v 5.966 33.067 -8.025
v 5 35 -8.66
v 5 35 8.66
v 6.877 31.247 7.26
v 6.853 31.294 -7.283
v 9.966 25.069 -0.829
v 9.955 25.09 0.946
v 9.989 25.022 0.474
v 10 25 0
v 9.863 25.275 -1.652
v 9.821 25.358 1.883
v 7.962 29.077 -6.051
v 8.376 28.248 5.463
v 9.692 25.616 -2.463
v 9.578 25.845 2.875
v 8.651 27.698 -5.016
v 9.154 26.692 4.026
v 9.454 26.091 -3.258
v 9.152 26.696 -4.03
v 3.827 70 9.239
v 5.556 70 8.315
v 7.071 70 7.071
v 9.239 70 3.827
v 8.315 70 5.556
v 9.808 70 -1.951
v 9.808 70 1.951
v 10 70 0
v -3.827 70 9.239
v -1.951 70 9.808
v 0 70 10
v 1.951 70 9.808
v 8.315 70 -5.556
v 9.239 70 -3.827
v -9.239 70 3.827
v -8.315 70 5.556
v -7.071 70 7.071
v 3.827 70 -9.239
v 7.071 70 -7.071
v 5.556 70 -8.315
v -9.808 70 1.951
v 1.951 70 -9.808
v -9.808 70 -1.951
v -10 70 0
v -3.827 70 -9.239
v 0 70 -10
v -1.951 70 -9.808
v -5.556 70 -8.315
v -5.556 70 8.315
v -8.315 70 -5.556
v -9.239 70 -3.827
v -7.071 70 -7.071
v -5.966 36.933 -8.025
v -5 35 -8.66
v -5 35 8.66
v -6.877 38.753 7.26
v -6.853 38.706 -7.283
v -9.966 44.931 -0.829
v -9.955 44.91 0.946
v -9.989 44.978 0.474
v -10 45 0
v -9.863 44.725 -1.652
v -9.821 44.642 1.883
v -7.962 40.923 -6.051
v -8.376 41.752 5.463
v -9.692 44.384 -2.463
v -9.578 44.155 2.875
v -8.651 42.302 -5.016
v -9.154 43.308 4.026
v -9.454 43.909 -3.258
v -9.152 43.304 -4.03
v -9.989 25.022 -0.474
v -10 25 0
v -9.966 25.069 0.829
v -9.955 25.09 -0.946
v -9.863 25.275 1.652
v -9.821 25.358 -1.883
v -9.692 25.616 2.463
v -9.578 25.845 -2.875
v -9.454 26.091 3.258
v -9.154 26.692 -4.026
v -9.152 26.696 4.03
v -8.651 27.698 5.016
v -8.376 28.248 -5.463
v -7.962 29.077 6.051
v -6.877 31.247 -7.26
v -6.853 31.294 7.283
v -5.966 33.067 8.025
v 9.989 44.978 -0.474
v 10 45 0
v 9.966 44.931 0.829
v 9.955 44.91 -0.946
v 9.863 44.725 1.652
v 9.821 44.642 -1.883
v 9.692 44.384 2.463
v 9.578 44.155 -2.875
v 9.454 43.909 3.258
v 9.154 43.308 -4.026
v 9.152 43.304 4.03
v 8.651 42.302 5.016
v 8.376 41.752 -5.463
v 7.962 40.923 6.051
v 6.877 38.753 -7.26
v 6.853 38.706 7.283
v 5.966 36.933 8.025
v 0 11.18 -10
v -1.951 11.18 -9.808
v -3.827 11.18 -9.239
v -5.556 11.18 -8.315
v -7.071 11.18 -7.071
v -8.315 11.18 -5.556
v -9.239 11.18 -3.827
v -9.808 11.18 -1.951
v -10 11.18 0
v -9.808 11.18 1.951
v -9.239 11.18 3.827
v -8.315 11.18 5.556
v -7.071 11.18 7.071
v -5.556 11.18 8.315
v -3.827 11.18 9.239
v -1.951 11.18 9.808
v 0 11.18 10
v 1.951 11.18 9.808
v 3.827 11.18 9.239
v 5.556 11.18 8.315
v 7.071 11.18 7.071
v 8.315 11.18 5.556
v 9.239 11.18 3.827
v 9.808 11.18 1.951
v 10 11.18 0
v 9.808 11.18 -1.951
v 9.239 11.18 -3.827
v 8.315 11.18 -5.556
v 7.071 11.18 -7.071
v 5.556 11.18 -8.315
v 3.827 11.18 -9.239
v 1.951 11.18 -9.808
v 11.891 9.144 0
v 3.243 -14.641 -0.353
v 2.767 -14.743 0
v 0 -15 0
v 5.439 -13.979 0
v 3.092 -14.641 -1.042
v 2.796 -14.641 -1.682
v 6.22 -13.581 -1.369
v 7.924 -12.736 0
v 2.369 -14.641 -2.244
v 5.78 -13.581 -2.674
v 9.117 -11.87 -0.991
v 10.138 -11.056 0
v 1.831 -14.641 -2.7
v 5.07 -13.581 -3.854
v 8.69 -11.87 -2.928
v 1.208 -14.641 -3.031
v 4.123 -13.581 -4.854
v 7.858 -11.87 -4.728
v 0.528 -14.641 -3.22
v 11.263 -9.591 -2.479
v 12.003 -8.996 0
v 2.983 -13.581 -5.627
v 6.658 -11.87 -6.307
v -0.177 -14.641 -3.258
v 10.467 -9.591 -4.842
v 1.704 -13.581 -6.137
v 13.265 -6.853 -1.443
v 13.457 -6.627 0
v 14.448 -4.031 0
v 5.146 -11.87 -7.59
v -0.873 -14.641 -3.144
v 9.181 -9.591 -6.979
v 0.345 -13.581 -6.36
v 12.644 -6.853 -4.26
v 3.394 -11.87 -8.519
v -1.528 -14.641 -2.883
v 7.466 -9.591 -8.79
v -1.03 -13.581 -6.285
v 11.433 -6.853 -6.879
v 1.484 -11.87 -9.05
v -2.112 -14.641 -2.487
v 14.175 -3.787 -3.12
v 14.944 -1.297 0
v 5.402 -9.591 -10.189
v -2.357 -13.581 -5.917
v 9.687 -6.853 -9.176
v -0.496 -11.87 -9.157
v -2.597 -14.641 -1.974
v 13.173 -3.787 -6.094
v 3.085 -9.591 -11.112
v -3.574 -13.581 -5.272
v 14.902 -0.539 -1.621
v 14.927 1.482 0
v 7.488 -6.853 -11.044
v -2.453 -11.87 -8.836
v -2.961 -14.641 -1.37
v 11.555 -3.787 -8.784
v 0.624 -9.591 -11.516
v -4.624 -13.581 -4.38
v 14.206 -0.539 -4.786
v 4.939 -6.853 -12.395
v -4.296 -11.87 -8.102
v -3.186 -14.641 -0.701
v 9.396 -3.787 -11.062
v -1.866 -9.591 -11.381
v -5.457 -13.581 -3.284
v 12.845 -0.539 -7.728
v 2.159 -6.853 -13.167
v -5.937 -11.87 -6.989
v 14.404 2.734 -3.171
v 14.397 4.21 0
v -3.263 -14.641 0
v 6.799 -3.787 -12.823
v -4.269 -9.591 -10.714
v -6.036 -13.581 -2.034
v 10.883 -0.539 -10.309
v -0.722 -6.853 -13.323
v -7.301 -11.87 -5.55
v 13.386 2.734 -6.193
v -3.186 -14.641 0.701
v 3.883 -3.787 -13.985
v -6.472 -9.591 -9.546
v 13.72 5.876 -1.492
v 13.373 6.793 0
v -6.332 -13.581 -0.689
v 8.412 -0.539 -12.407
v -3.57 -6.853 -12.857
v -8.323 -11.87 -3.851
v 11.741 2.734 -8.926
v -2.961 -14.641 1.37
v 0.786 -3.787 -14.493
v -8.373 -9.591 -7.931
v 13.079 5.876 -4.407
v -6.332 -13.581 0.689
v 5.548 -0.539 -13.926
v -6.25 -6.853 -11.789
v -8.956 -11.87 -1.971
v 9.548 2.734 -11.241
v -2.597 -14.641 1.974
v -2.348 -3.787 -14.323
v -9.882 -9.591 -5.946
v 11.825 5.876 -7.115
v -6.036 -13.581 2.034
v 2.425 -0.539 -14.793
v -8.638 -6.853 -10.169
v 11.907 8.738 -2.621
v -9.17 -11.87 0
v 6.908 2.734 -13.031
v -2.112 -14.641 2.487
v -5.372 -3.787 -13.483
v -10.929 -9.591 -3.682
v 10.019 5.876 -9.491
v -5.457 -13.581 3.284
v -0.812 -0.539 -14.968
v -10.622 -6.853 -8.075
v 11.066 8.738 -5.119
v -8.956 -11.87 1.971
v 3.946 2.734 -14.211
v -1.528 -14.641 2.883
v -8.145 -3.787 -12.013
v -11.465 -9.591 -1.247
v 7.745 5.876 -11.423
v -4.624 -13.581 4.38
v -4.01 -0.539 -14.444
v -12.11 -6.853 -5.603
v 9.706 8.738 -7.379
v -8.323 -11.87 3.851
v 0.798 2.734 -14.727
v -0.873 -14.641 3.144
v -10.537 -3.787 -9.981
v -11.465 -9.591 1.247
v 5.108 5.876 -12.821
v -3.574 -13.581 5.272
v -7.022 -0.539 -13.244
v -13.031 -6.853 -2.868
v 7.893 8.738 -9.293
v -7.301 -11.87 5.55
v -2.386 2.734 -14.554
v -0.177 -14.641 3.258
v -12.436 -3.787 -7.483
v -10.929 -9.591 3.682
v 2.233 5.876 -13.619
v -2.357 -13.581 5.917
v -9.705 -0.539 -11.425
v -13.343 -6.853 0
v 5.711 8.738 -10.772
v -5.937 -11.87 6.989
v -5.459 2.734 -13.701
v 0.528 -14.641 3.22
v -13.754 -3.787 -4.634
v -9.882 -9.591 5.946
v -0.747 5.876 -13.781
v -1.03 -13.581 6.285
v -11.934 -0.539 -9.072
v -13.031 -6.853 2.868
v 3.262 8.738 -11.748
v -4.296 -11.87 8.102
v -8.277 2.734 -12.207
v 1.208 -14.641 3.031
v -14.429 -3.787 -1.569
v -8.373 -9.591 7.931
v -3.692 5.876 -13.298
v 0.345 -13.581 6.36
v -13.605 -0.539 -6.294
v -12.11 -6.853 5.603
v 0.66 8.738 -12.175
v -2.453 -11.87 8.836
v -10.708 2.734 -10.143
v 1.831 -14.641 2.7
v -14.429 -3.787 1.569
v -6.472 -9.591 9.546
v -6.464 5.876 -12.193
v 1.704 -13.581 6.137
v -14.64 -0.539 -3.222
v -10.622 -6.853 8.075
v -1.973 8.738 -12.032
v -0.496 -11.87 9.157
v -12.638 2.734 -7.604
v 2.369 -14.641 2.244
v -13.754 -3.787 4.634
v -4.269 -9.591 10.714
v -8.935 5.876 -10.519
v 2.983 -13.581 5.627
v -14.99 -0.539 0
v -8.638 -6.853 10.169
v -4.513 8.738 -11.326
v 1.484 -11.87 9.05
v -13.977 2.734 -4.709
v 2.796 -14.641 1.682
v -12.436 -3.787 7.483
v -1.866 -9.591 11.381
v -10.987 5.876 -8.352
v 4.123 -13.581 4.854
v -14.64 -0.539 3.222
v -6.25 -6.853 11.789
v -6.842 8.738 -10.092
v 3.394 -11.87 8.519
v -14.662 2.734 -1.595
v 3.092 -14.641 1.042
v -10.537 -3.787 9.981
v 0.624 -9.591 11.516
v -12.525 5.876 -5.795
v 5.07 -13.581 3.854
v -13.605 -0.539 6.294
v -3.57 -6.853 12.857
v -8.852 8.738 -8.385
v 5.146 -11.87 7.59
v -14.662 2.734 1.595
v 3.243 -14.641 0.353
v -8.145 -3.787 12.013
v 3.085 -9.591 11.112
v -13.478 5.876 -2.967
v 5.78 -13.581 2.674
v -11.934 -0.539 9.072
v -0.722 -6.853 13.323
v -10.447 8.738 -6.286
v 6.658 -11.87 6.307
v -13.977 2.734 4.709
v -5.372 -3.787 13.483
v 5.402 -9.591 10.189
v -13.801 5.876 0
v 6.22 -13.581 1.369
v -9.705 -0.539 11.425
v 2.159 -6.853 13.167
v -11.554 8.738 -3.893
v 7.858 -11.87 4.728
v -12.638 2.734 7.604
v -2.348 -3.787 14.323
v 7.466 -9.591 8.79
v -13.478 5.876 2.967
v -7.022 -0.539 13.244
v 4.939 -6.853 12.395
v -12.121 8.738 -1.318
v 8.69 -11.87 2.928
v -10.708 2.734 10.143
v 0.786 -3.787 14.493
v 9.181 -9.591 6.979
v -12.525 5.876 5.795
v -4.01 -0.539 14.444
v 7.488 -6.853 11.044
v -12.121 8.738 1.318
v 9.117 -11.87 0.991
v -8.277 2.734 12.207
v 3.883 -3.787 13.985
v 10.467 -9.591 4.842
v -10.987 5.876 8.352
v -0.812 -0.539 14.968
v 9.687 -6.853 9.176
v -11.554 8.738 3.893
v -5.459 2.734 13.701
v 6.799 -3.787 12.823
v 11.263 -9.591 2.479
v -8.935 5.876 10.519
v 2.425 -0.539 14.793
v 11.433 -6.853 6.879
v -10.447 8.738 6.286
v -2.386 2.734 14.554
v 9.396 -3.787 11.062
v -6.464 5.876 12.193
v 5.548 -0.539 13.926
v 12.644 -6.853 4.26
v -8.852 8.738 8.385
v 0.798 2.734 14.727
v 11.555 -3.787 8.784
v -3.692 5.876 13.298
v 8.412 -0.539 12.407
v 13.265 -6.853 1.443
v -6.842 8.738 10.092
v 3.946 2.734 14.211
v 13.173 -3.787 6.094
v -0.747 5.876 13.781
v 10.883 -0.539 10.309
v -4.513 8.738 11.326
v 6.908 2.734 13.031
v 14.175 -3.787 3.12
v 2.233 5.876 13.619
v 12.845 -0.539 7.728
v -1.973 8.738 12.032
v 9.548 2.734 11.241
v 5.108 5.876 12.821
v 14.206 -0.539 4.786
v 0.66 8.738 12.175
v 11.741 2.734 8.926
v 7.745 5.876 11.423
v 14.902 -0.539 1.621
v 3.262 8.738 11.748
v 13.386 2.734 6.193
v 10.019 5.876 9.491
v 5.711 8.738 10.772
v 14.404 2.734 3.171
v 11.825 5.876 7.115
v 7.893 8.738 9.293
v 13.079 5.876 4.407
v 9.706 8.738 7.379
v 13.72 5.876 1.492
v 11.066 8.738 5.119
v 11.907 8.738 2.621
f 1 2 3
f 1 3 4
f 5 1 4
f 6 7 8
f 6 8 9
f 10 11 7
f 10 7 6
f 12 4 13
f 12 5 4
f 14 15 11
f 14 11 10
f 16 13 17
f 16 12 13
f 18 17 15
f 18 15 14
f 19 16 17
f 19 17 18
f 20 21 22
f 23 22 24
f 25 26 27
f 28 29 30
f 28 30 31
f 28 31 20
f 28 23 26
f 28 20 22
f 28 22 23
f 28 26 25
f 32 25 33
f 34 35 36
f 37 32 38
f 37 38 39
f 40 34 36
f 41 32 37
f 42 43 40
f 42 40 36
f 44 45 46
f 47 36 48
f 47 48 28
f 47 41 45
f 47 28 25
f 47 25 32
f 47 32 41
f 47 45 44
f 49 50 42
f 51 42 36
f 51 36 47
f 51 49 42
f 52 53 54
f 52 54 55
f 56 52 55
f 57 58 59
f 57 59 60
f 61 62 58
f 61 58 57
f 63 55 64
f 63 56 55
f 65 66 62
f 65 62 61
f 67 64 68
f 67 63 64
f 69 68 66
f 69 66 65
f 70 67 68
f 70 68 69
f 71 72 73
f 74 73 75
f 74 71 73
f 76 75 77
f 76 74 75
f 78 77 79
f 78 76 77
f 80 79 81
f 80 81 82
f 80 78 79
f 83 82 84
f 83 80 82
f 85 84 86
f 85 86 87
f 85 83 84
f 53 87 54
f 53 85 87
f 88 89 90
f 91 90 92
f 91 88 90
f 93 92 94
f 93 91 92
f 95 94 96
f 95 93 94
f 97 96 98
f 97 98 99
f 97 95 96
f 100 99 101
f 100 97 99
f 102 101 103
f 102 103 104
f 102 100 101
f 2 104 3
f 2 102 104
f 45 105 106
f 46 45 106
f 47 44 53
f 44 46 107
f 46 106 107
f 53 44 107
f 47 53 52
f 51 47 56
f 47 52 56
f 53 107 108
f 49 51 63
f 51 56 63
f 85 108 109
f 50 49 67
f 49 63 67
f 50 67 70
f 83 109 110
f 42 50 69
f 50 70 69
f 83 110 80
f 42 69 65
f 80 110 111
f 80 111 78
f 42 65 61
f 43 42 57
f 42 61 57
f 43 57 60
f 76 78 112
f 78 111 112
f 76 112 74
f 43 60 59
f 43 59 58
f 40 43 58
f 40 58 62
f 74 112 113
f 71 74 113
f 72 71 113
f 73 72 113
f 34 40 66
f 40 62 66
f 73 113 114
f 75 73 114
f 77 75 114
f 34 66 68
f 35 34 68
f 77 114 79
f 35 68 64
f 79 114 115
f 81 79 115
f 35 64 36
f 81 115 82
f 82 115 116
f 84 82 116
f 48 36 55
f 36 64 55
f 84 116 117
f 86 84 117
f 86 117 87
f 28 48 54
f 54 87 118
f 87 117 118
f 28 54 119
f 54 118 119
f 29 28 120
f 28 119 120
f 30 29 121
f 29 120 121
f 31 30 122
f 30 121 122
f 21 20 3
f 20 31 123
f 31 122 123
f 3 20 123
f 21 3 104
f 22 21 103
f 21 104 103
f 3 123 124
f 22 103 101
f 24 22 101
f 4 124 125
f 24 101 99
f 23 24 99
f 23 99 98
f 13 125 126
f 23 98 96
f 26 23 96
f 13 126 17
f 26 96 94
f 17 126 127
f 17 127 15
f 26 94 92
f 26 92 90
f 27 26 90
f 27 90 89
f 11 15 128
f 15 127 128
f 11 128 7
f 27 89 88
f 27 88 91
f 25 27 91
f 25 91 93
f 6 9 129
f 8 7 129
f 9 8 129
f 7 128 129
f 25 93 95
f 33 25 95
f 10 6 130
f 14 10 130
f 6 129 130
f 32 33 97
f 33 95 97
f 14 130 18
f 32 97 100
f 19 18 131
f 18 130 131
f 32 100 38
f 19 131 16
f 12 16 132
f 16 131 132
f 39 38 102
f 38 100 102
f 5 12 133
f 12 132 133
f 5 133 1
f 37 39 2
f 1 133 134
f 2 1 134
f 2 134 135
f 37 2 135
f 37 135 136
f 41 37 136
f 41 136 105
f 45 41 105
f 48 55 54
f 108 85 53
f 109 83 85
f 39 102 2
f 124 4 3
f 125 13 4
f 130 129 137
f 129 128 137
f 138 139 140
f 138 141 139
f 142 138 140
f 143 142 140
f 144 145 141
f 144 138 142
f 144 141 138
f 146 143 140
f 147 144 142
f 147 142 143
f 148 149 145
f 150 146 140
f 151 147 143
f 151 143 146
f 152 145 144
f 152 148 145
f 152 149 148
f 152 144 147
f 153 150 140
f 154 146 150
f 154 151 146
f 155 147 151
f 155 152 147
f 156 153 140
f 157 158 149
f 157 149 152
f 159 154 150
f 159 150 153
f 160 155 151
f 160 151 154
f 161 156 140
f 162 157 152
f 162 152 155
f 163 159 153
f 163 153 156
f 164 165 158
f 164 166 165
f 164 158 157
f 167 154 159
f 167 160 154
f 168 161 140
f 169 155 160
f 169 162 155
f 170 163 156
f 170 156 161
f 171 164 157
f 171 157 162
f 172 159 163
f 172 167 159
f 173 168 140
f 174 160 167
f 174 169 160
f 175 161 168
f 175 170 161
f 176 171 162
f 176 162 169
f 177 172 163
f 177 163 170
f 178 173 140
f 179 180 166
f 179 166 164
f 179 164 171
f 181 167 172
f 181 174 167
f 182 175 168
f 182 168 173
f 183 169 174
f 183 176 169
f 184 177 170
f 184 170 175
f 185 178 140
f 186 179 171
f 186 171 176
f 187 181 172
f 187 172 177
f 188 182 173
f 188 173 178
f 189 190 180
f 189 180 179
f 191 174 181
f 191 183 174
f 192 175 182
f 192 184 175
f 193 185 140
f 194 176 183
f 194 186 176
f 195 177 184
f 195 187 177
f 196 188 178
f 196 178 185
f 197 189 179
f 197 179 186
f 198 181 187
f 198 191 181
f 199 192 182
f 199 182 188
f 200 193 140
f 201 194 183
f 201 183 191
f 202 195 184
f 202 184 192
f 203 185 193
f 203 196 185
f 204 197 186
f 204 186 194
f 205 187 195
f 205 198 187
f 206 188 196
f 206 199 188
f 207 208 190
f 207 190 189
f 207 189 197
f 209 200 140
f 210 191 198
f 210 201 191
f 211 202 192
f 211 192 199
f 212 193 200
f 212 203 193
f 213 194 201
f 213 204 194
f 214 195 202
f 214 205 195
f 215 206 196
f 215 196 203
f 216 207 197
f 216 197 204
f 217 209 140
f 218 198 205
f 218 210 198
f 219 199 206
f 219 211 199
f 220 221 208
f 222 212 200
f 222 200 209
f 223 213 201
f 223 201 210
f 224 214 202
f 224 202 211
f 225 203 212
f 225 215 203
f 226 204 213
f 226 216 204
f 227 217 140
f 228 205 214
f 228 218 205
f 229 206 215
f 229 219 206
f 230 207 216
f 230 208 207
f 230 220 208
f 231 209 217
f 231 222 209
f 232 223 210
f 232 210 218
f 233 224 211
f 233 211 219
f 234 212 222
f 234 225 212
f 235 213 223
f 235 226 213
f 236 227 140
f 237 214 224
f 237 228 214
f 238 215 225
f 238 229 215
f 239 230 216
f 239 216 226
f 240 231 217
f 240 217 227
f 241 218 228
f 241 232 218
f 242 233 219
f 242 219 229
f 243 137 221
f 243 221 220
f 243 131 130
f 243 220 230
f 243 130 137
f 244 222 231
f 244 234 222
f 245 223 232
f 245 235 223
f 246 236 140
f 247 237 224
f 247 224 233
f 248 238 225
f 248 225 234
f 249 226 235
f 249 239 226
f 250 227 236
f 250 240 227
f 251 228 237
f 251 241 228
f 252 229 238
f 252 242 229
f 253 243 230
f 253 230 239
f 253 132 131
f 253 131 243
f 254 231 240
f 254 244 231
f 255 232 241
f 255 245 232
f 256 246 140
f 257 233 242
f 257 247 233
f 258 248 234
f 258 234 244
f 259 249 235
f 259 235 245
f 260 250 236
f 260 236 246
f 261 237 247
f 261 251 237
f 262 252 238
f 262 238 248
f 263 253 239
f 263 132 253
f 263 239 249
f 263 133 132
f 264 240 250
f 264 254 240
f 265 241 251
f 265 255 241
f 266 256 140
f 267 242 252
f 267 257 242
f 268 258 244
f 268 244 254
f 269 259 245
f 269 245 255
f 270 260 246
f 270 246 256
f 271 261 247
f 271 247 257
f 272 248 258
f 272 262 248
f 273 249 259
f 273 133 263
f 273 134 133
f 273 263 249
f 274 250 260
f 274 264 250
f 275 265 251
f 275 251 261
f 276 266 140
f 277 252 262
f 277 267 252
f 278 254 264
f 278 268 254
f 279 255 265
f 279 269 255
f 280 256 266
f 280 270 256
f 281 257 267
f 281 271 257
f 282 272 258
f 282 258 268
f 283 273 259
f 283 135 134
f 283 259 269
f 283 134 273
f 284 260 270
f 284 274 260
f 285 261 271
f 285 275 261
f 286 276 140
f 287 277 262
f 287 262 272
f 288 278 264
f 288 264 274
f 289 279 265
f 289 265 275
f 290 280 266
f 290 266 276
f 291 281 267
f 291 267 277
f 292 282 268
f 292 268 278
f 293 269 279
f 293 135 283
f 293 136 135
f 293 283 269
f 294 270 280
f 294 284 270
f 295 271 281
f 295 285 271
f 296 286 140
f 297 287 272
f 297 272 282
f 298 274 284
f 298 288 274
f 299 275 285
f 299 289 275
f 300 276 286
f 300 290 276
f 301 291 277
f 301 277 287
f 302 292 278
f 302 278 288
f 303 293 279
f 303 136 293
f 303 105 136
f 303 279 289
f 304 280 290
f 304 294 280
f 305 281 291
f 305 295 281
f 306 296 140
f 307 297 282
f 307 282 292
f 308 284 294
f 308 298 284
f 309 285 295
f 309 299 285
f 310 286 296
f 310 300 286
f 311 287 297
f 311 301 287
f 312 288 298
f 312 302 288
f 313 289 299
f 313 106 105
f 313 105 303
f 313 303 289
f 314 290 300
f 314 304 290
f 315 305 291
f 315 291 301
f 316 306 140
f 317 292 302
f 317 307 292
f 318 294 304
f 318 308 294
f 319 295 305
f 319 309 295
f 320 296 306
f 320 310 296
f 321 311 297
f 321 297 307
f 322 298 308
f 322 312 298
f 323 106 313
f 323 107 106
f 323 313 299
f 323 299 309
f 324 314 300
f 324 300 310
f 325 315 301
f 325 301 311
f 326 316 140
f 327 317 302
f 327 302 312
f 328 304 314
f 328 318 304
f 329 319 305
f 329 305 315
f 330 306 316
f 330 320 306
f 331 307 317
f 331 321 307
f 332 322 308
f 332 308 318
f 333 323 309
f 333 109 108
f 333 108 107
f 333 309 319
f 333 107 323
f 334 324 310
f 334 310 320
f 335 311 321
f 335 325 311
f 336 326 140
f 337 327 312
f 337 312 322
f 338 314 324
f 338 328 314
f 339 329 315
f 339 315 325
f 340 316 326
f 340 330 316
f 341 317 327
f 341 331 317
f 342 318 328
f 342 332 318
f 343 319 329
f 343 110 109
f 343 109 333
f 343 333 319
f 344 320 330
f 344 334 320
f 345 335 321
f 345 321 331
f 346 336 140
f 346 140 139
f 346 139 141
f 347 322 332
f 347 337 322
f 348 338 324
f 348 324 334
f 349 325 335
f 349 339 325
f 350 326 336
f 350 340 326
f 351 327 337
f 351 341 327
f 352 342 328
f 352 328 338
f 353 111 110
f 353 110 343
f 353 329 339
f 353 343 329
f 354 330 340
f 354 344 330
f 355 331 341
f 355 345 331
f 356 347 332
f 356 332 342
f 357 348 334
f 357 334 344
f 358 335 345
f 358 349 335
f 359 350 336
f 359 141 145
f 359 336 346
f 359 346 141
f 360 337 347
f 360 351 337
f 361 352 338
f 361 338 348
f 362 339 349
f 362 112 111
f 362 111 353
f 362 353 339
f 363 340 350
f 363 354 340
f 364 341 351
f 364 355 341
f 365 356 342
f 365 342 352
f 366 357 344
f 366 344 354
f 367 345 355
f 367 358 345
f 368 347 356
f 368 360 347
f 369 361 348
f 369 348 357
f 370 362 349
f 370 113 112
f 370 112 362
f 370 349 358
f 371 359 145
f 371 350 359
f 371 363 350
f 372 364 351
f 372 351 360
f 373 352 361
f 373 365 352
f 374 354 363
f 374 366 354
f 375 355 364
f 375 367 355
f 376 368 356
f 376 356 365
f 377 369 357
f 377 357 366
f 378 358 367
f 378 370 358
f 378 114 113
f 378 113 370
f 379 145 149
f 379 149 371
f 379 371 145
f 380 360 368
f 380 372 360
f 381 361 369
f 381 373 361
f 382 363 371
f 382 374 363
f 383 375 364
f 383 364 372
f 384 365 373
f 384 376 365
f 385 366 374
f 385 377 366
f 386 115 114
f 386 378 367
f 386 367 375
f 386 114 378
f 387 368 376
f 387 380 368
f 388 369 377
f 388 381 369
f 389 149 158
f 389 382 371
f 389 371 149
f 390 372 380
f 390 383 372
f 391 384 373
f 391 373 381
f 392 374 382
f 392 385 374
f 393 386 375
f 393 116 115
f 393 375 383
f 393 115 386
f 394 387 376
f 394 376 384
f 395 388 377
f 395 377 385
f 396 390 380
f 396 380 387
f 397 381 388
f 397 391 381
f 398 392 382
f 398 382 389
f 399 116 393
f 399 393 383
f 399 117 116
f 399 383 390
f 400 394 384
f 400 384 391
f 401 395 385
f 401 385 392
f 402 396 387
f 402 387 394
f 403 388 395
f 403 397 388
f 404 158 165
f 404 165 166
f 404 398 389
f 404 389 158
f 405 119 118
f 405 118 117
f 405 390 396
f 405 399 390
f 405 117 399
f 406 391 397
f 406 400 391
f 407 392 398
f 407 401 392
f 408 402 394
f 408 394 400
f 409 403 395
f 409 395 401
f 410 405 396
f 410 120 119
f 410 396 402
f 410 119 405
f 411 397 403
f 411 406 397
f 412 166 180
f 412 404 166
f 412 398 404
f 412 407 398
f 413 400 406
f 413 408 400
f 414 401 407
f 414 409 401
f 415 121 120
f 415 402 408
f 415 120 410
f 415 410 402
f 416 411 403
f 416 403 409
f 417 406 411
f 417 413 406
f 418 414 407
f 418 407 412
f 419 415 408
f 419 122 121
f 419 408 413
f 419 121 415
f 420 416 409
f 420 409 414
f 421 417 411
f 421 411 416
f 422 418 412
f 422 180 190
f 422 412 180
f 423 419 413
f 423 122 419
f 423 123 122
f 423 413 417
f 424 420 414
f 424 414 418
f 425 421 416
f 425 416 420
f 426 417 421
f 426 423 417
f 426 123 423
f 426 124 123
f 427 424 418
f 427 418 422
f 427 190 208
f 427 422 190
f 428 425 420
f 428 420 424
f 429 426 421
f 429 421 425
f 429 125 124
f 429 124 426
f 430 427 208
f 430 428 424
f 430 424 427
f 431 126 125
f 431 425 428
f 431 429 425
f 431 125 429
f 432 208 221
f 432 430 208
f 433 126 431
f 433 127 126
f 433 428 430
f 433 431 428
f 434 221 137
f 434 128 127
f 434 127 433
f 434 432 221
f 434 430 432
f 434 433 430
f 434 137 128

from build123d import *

# Parameters (mm, degrees)
SKETCH2_R               = 10
BOSS_EXTRUDE1_DEPTH     = 70
CUT_EXTRUDE1_DEPTH      = 74.143694192
CUT_EXTRUDE1_DEPTH_BACK = 74.143694192


with BuildPart() as part:
    # Sketch1 → Revolve1 (revolve)
    with BuildSketch(Plane.XY):
        with BuildLine():
            Line((0, 15), (0, -15))
            ThreePointArc((0, -15), (15, 0), (0, 15))
        make_face()
    revolve(axis=Axis((0, -733.142524484, 0), (0, 1, 0)))

    # Sketch2 → Boss-Extrude1 (add)
    with BuildSketch(Plane(origin=(0, 0, 0), x_dir=(1, 0, 0), z_dir=(0, 1, 0))):
        with Locations(Location((0, 0, 0), (0, 0, 90))):
            Circle(SKETCH2_R)
    extrude(amount=BOSS_EXTRUDE1_DEPTH)

    # Sketch3 → Cut-Extrude1 (cut, two sides: drawn at the far end of the back side and taken through both)
    with BuildSketch(Plane.XY.offset(-CUT_EXTRUDE1_DEPTH_BACK)):
        Polygon((10, 45), (5, 35), (10, 25), align=None)
        Polygon((-10, 45), (-10, 25), (-5, 35), align=None)
    extrude(amount=CUT_EXTRUDE1_DEPTH + CUT_EXTRUDE1_DEPTH_BACK, mode=Mode.SUBTRACT)


solid = part.part
